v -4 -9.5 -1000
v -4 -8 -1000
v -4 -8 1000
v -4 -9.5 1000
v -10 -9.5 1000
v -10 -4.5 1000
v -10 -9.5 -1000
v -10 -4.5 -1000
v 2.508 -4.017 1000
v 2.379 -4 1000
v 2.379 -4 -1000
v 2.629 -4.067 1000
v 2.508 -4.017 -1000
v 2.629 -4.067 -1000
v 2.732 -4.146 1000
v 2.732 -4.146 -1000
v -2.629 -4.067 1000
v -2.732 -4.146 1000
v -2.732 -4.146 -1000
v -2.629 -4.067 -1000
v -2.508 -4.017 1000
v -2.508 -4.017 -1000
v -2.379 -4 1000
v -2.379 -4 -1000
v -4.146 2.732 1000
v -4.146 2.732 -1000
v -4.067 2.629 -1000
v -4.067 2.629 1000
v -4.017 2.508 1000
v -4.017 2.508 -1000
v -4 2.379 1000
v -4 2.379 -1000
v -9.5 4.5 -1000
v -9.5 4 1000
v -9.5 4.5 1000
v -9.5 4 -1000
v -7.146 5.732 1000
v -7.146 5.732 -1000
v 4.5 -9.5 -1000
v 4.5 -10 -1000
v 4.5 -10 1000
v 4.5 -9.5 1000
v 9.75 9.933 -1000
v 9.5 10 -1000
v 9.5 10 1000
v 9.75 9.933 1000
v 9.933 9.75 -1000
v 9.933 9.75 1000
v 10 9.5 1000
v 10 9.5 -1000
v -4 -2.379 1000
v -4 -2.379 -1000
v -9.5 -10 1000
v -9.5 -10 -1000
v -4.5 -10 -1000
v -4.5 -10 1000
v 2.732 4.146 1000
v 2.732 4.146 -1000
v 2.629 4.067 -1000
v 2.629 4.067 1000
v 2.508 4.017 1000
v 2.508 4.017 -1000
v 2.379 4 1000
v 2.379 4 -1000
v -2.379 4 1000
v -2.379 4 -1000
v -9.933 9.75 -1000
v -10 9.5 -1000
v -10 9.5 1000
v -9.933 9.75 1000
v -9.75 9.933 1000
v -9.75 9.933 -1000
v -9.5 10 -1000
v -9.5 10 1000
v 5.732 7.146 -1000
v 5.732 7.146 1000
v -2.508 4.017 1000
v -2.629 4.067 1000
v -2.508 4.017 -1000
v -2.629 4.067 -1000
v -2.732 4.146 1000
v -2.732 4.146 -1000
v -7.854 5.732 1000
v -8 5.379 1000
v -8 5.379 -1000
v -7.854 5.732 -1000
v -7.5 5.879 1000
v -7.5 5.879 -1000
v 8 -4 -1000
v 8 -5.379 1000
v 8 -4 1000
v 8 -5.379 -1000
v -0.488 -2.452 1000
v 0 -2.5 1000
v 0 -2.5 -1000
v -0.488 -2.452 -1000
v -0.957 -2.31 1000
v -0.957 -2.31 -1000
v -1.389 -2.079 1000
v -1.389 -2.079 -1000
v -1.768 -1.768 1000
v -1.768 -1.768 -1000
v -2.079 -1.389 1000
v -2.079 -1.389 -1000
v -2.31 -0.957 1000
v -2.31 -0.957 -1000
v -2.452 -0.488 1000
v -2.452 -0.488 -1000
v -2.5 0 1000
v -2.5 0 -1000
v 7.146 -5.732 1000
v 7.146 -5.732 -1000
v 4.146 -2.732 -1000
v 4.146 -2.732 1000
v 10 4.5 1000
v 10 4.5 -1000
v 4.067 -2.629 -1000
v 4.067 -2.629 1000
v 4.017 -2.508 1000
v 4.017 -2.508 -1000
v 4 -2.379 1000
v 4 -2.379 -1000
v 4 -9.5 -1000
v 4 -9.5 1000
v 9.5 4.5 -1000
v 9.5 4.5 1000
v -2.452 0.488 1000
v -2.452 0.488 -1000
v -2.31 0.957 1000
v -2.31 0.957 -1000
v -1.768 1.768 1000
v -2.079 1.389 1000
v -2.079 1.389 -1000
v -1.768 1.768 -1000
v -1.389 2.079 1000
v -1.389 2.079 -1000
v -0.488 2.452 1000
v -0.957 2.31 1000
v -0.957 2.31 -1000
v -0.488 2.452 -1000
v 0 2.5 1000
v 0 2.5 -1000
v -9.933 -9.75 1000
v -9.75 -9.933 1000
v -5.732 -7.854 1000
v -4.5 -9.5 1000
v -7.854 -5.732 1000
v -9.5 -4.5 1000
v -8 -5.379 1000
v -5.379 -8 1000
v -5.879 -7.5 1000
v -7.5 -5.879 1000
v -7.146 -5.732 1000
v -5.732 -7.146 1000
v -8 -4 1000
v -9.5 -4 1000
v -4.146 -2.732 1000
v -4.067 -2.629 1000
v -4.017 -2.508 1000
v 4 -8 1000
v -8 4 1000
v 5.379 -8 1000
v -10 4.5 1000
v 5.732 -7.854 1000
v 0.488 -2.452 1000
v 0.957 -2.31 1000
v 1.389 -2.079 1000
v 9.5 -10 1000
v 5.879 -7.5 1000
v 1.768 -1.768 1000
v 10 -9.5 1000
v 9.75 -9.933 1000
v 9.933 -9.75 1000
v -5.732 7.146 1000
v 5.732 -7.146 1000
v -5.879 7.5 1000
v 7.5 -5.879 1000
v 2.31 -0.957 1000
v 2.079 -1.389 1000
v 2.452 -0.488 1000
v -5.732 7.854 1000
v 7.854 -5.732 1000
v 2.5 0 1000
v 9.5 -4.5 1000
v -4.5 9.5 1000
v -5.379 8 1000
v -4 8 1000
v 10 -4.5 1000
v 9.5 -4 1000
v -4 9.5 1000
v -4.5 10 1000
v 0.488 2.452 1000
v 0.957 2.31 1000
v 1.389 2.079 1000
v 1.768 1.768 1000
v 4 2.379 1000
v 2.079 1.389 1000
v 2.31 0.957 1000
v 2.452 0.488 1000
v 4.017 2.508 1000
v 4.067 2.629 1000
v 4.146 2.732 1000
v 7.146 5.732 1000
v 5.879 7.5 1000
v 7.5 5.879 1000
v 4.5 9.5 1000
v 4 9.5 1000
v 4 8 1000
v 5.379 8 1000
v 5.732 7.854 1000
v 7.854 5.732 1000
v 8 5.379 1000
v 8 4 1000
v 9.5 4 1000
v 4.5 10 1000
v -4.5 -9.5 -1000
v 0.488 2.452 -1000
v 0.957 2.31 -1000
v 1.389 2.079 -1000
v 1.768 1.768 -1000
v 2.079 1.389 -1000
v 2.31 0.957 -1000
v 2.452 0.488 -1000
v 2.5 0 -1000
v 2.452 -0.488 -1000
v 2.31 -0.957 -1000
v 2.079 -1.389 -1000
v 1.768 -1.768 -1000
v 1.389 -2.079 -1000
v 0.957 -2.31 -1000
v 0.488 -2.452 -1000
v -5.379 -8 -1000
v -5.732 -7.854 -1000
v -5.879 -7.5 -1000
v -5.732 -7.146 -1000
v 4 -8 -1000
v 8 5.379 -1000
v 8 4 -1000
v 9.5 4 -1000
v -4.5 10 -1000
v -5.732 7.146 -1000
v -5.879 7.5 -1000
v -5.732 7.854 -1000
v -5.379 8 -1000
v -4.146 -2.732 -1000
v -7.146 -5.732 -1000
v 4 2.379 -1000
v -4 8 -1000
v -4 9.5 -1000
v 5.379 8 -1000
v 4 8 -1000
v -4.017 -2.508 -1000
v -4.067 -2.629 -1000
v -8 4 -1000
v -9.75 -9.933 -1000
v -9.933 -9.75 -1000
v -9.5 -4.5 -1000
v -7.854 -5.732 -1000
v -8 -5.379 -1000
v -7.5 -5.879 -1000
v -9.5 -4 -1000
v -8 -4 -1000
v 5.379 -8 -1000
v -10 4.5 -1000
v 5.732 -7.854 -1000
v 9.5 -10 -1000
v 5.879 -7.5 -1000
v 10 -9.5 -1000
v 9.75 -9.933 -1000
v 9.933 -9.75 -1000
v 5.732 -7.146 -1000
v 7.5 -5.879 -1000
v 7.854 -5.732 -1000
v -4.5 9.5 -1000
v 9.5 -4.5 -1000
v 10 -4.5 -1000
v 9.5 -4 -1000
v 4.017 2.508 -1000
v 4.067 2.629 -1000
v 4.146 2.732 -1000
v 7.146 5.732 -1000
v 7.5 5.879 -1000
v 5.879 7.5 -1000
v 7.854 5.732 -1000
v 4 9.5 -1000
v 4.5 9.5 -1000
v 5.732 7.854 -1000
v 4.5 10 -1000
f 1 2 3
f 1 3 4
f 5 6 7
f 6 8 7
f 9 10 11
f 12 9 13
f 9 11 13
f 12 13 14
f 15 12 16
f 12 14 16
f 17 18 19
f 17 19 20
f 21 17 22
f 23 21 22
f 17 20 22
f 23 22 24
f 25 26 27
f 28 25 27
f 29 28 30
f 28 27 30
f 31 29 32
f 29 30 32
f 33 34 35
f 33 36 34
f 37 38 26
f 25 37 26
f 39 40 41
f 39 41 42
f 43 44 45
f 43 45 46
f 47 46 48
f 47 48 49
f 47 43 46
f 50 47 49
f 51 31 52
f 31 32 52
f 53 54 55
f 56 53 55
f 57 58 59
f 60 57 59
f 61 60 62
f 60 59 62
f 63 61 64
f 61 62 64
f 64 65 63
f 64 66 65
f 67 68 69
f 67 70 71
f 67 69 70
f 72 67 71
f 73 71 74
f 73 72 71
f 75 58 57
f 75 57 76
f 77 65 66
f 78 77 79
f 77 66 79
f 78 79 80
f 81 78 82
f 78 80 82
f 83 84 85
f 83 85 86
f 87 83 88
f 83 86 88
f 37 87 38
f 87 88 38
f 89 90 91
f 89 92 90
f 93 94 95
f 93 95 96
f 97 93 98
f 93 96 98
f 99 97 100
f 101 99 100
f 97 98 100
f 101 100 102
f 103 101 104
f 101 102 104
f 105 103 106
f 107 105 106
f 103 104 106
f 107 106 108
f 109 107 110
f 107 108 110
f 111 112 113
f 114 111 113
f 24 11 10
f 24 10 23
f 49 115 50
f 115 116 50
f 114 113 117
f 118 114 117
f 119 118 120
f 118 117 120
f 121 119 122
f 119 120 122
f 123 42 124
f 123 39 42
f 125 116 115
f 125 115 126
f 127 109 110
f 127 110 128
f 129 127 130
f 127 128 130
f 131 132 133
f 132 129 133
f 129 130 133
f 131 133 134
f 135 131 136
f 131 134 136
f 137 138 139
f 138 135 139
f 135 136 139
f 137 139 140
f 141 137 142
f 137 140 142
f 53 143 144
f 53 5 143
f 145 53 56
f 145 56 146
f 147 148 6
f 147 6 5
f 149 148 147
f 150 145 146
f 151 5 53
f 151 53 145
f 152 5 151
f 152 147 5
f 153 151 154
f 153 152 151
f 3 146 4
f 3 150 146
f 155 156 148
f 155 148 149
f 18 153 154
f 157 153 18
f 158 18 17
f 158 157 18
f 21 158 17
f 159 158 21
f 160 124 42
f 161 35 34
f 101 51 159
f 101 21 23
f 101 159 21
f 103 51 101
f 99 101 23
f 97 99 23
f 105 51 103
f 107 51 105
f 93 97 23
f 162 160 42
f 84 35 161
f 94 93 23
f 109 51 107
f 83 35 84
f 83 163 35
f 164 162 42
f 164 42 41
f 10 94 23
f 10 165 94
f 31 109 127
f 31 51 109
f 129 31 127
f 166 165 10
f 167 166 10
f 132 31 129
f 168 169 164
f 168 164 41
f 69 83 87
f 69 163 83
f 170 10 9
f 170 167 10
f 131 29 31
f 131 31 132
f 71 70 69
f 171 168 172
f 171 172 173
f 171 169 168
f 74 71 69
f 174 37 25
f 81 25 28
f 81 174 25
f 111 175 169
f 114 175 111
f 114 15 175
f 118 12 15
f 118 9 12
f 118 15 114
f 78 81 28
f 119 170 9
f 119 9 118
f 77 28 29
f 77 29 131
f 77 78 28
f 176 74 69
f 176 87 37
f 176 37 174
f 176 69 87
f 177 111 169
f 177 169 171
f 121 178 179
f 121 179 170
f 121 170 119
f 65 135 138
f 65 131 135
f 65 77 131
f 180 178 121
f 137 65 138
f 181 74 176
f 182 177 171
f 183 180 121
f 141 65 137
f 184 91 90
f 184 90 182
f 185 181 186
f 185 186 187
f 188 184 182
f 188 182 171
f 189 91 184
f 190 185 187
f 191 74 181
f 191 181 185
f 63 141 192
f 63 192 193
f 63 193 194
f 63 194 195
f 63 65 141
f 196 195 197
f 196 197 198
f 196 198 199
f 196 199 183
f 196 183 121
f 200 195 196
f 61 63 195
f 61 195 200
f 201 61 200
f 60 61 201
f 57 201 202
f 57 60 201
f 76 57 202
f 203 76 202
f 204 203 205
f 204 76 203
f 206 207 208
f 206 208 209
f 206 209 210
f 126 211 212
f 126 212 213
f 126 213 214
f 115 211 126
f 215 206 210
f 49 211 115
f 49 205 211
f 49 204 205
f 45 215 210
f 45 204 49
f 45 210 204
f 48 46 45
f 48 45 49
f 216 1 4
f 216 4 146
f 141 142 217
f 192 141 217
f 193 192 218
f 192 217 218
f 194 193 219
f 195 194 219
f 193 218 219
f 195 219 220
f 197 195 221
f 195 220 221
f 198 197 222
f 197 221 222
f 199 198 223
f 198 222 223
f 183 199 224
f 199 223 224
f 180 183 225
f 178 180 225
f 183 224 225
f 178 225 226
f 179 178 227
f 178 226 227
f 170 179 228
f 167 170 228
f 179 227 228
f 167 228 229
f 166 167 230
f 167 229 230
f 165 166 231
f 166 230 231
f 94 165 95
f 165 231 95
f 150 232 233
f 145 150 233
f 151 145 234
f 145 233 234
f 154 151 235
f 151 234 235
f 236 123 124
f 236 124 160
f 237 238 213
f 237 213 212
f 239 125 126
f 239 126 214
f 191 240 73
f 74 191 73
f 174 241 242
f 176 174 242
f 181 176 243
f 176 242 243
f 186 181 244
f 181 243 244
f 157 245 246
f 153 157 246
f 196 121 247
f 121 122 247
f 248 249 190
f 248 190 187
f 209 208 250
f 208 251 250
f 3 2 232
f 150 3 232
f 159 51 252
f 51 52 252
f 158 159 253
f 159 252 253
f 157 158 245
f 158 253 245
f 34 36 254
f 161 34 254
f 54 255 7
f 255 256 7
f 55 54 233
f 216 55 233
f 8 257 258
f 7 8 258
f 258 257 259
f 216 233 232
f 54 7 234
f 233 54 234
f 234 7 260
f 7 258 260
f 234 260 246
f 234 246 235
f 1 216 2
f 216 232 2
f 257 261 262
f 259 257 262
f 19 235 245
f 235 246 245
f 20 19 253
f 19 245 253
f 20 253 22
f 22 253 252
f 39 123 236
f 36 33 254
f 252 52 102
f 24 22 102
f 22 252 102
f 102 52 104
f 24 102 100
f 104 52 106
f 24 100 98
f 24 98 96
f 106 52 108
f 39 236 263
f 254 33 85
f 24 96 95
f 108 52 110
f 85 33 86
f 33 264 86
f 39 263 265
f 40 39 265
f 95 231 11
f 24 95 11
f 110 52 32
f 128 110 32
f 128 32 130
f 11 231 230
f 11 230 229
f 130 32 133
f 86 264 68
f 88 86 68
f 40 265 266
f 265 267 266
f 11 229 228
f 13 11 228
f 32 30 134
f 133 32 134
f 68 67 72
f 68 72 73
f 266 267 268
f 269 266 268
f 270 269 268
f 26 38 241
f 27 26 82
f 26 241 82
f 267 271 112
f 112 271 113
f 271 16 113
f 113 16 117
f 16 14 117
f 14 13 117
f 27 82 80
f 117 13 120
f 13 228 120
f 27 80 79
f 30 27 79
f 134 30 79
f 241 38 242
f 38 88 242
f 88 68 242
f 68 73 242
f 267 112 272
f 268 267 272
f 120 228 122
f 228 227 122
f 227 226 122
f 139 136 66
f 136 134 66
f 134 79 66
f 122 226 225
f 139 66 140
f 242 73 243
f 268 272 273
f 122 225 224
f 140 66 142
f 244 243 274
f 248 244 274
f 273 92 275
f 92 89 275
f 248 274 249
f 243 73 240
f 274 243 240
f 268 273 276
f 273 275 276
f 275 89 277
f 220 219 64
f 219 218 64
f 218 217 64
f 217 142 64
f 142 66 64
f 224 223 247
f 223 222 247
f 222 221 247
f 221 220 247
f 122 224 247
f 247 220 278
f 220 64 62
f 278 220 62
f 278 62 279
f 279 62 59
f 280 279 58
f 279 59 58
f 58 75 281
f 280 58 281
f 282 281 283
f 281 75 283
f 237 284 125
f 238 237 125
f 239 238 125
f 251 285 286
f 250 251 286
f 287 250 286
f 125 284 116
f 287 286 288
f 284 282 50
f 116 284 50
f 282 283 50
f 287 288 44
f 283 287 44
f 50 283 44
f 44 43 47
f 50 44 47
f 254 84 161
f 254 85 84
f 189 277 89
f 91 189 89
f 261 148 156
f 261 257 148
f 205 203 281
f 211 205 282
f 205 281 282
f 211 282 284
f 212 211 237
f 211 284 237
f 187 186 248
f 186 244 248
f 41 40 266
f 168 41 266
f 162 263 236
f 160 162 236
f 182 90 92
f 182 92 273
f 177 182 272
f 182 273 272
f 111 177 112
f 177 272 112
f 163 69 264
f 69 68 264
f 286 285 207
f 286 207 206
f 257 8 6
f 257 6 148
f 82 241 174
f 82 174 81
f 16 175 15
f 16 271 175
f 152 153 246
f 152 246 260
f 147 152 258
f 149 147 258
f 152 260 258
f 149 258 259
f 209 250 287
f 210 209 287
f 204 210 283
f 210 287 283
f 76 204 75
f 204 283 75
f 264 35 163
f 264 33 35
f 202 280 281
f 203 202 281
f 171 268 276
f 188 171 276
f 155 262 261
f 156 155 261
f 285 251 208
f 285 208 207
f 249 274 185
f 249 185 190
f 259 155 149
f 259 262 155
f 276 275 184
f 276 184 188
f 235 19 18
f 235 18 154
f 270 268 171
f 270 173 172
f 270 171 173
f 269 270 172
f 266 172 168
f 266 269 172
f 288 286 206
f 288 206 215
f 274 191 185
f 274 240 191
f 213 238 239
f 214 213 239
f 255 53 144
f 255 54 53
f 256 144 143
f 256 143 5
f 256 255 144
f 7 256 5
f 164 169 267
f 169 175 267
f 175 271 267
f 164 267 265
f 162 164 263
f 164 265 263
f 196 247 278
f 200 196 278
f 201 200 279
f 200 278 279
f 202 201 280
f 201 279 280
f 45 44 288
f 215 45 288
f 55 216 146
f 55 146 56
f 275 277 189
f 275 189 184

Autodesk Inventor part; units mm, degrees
ref_plane "YZ Plane" through (0, 0, 0) normal (1, 0, 0) x (0, 1, 0)
ref_plane "XZ Plane" through (0, 0, 0) normal (0, 1, 0) x (-1, 0, 0)
ref_plane "XY Plane" through (0, 0, 0) normal (0, 0, 1) x (1, 0, 0)
sketch "Esboço1" plane through (0, 0, 0) normal (0, 0, 1) x (1, 0, 0)
  line L0 (-10, 10) -> (10, 10) construction
  circle A0 centre (0, 0) radius 2.5 construction
  line L1 (-4, 4) -> (4, 4) construction
  line L2 (0, 0) -> (-10, 10) construction
  line L3 (-6.5858, 8) -> (-4, 8) construction
  line L4 (-4, 8) -> (-4, 10) construction
  line L5 (-4, 10) -> (-10, 10) construction
  line L6 (-4, 4) -> (-4, -4) construction
  line L7 (-6.5858, 8) -> (-2.5858, 4) construction
  line L8 (-8, 6.5858) -> (-4, 2.5858) construction
  line L9 (-10, 10) -> (-10, 0) construction
  line L10 (-10, 10) -> (-10, 4) construction
  line L11 (-8, 6.5858) -> (-8, 4) construction
  line L12 (-8, 4) -> (-10, 4) construction
  line L13 (-10, 4) -> (-9.5, 4) construction
  line L14 (-9.5, 4) -> (-9.5, 4.5)
  line L15 (-9.5, 4.5) -> (-10, 4.5)
  line L16 (-10, 4.5) -> (-10, 4) construction
  line L17 (-10, 10) -> (-10, 4.5) construction
  line L18 (-9.5, 4) -> (-8, 4)
  line L19 (-4, 10) -> (-4.5, 10) construction
  line L20 (-4.5, 10) -> (-4.5, 9.5)
  line L21 (-4.5, 9.5) -> (-4, 9.5)
  line L22 (-4, 9.5) -> (-4, 10) construction
  line L23 (-4, 9.5) -> (-4, 8)
  line L24 (-4.5, 10) -> (-10, 10) construction
  arc A1 (-9.5, 10) -> (-10, 9.5) centre (-9.5, 9.5) ccw
  line L25 (-4.5, 10) -> (-9.5, 10)
  line L26 (-10, 9.5) -> (-10, 4.5)
  line L27 (-2.5858, 4) -> (0, 4) construction
  arc A2 (-5.3787, 8) -> (-5.7322, 7.1464) centre (-5.3787, 7.5) ccw
  line L28 (-5.3787, 8) -> (-4, 8)
  line L29 (-5.7322, 7.1464) -> (-2.5858, 4) construction
  arc A3 (-7.1464, 5.7322) -> (-8, 5.3787) centre (-7.5, 5.3787) ccw
  line L30 (-7.1464, 5.7322) -> (-4, 2.5858) construction
  line L31 (-8, 5.3787) -> (-8, 4)
  arc A4 (0, 2.5) -> (-2.5, 0) centre (0, 0) ccw
  line L32 (0, 4) -> (0, 2.5)
  line L33 (-4, 2.5858) -> (-4, 0) construction
  line L34 (-4, 0) -> (-2.5, 0)
  arc A5 (-2.7322, 4.1464) -> (-2.3787, 4) centre (-2.3787, 4.5) ccw
  line L35 (-5.7322, 7.1464) -> (-2.7322, 4.1464)
  line L36 (-2.3787, 4) -> (0, 4)
  arc A6 (-4, 2.3787) -> (-4.1464, 2.7322) centre (-4.5, 2.3787) ccw
  line L37 (-7.1464, 5.7322) -> (-4.1464, 2.7322)
  line L38 (-4, 2.3787) -> (-4, 0)
  point P0 (0, 10)
  point P1 (-3.25, 0)
  dimension "d0" = 20
  dimension "d2" = 5
  dimension "d3" = 6
  dimension "d5" = 2
  dimension "d7" = 1
  dimension "d8" = 6
  dimension "d9" = 1
  dimension "d10" = 0.5
  dimension "d11" = 0.5
  dimension "d12" = 0.5
  dimension "d14" = 0.5
  dimension "d15" = 0.5
  dimension "d16" = 10
  dimension "d17" = 2.5
  dimension "d20" = 0.5
  dimension "d21" = 0.5
extrude "Extrusão1" add sketch "Esboço1" along normal mid plane 2000
mirror "Espelhar1" about plane through (0, 0, 0) normal (1, 0, 0) of "Extrusão1"
mirror "Espelhar2" about plane through (0, 0, 0) normal (0, 1, 0) of "Extrusão1", "Espelhar1"
equation "\"d16\" = 0.5 * d0"
properties part number "20×20 4 slots profile_AST02002004" material "Ouro"
